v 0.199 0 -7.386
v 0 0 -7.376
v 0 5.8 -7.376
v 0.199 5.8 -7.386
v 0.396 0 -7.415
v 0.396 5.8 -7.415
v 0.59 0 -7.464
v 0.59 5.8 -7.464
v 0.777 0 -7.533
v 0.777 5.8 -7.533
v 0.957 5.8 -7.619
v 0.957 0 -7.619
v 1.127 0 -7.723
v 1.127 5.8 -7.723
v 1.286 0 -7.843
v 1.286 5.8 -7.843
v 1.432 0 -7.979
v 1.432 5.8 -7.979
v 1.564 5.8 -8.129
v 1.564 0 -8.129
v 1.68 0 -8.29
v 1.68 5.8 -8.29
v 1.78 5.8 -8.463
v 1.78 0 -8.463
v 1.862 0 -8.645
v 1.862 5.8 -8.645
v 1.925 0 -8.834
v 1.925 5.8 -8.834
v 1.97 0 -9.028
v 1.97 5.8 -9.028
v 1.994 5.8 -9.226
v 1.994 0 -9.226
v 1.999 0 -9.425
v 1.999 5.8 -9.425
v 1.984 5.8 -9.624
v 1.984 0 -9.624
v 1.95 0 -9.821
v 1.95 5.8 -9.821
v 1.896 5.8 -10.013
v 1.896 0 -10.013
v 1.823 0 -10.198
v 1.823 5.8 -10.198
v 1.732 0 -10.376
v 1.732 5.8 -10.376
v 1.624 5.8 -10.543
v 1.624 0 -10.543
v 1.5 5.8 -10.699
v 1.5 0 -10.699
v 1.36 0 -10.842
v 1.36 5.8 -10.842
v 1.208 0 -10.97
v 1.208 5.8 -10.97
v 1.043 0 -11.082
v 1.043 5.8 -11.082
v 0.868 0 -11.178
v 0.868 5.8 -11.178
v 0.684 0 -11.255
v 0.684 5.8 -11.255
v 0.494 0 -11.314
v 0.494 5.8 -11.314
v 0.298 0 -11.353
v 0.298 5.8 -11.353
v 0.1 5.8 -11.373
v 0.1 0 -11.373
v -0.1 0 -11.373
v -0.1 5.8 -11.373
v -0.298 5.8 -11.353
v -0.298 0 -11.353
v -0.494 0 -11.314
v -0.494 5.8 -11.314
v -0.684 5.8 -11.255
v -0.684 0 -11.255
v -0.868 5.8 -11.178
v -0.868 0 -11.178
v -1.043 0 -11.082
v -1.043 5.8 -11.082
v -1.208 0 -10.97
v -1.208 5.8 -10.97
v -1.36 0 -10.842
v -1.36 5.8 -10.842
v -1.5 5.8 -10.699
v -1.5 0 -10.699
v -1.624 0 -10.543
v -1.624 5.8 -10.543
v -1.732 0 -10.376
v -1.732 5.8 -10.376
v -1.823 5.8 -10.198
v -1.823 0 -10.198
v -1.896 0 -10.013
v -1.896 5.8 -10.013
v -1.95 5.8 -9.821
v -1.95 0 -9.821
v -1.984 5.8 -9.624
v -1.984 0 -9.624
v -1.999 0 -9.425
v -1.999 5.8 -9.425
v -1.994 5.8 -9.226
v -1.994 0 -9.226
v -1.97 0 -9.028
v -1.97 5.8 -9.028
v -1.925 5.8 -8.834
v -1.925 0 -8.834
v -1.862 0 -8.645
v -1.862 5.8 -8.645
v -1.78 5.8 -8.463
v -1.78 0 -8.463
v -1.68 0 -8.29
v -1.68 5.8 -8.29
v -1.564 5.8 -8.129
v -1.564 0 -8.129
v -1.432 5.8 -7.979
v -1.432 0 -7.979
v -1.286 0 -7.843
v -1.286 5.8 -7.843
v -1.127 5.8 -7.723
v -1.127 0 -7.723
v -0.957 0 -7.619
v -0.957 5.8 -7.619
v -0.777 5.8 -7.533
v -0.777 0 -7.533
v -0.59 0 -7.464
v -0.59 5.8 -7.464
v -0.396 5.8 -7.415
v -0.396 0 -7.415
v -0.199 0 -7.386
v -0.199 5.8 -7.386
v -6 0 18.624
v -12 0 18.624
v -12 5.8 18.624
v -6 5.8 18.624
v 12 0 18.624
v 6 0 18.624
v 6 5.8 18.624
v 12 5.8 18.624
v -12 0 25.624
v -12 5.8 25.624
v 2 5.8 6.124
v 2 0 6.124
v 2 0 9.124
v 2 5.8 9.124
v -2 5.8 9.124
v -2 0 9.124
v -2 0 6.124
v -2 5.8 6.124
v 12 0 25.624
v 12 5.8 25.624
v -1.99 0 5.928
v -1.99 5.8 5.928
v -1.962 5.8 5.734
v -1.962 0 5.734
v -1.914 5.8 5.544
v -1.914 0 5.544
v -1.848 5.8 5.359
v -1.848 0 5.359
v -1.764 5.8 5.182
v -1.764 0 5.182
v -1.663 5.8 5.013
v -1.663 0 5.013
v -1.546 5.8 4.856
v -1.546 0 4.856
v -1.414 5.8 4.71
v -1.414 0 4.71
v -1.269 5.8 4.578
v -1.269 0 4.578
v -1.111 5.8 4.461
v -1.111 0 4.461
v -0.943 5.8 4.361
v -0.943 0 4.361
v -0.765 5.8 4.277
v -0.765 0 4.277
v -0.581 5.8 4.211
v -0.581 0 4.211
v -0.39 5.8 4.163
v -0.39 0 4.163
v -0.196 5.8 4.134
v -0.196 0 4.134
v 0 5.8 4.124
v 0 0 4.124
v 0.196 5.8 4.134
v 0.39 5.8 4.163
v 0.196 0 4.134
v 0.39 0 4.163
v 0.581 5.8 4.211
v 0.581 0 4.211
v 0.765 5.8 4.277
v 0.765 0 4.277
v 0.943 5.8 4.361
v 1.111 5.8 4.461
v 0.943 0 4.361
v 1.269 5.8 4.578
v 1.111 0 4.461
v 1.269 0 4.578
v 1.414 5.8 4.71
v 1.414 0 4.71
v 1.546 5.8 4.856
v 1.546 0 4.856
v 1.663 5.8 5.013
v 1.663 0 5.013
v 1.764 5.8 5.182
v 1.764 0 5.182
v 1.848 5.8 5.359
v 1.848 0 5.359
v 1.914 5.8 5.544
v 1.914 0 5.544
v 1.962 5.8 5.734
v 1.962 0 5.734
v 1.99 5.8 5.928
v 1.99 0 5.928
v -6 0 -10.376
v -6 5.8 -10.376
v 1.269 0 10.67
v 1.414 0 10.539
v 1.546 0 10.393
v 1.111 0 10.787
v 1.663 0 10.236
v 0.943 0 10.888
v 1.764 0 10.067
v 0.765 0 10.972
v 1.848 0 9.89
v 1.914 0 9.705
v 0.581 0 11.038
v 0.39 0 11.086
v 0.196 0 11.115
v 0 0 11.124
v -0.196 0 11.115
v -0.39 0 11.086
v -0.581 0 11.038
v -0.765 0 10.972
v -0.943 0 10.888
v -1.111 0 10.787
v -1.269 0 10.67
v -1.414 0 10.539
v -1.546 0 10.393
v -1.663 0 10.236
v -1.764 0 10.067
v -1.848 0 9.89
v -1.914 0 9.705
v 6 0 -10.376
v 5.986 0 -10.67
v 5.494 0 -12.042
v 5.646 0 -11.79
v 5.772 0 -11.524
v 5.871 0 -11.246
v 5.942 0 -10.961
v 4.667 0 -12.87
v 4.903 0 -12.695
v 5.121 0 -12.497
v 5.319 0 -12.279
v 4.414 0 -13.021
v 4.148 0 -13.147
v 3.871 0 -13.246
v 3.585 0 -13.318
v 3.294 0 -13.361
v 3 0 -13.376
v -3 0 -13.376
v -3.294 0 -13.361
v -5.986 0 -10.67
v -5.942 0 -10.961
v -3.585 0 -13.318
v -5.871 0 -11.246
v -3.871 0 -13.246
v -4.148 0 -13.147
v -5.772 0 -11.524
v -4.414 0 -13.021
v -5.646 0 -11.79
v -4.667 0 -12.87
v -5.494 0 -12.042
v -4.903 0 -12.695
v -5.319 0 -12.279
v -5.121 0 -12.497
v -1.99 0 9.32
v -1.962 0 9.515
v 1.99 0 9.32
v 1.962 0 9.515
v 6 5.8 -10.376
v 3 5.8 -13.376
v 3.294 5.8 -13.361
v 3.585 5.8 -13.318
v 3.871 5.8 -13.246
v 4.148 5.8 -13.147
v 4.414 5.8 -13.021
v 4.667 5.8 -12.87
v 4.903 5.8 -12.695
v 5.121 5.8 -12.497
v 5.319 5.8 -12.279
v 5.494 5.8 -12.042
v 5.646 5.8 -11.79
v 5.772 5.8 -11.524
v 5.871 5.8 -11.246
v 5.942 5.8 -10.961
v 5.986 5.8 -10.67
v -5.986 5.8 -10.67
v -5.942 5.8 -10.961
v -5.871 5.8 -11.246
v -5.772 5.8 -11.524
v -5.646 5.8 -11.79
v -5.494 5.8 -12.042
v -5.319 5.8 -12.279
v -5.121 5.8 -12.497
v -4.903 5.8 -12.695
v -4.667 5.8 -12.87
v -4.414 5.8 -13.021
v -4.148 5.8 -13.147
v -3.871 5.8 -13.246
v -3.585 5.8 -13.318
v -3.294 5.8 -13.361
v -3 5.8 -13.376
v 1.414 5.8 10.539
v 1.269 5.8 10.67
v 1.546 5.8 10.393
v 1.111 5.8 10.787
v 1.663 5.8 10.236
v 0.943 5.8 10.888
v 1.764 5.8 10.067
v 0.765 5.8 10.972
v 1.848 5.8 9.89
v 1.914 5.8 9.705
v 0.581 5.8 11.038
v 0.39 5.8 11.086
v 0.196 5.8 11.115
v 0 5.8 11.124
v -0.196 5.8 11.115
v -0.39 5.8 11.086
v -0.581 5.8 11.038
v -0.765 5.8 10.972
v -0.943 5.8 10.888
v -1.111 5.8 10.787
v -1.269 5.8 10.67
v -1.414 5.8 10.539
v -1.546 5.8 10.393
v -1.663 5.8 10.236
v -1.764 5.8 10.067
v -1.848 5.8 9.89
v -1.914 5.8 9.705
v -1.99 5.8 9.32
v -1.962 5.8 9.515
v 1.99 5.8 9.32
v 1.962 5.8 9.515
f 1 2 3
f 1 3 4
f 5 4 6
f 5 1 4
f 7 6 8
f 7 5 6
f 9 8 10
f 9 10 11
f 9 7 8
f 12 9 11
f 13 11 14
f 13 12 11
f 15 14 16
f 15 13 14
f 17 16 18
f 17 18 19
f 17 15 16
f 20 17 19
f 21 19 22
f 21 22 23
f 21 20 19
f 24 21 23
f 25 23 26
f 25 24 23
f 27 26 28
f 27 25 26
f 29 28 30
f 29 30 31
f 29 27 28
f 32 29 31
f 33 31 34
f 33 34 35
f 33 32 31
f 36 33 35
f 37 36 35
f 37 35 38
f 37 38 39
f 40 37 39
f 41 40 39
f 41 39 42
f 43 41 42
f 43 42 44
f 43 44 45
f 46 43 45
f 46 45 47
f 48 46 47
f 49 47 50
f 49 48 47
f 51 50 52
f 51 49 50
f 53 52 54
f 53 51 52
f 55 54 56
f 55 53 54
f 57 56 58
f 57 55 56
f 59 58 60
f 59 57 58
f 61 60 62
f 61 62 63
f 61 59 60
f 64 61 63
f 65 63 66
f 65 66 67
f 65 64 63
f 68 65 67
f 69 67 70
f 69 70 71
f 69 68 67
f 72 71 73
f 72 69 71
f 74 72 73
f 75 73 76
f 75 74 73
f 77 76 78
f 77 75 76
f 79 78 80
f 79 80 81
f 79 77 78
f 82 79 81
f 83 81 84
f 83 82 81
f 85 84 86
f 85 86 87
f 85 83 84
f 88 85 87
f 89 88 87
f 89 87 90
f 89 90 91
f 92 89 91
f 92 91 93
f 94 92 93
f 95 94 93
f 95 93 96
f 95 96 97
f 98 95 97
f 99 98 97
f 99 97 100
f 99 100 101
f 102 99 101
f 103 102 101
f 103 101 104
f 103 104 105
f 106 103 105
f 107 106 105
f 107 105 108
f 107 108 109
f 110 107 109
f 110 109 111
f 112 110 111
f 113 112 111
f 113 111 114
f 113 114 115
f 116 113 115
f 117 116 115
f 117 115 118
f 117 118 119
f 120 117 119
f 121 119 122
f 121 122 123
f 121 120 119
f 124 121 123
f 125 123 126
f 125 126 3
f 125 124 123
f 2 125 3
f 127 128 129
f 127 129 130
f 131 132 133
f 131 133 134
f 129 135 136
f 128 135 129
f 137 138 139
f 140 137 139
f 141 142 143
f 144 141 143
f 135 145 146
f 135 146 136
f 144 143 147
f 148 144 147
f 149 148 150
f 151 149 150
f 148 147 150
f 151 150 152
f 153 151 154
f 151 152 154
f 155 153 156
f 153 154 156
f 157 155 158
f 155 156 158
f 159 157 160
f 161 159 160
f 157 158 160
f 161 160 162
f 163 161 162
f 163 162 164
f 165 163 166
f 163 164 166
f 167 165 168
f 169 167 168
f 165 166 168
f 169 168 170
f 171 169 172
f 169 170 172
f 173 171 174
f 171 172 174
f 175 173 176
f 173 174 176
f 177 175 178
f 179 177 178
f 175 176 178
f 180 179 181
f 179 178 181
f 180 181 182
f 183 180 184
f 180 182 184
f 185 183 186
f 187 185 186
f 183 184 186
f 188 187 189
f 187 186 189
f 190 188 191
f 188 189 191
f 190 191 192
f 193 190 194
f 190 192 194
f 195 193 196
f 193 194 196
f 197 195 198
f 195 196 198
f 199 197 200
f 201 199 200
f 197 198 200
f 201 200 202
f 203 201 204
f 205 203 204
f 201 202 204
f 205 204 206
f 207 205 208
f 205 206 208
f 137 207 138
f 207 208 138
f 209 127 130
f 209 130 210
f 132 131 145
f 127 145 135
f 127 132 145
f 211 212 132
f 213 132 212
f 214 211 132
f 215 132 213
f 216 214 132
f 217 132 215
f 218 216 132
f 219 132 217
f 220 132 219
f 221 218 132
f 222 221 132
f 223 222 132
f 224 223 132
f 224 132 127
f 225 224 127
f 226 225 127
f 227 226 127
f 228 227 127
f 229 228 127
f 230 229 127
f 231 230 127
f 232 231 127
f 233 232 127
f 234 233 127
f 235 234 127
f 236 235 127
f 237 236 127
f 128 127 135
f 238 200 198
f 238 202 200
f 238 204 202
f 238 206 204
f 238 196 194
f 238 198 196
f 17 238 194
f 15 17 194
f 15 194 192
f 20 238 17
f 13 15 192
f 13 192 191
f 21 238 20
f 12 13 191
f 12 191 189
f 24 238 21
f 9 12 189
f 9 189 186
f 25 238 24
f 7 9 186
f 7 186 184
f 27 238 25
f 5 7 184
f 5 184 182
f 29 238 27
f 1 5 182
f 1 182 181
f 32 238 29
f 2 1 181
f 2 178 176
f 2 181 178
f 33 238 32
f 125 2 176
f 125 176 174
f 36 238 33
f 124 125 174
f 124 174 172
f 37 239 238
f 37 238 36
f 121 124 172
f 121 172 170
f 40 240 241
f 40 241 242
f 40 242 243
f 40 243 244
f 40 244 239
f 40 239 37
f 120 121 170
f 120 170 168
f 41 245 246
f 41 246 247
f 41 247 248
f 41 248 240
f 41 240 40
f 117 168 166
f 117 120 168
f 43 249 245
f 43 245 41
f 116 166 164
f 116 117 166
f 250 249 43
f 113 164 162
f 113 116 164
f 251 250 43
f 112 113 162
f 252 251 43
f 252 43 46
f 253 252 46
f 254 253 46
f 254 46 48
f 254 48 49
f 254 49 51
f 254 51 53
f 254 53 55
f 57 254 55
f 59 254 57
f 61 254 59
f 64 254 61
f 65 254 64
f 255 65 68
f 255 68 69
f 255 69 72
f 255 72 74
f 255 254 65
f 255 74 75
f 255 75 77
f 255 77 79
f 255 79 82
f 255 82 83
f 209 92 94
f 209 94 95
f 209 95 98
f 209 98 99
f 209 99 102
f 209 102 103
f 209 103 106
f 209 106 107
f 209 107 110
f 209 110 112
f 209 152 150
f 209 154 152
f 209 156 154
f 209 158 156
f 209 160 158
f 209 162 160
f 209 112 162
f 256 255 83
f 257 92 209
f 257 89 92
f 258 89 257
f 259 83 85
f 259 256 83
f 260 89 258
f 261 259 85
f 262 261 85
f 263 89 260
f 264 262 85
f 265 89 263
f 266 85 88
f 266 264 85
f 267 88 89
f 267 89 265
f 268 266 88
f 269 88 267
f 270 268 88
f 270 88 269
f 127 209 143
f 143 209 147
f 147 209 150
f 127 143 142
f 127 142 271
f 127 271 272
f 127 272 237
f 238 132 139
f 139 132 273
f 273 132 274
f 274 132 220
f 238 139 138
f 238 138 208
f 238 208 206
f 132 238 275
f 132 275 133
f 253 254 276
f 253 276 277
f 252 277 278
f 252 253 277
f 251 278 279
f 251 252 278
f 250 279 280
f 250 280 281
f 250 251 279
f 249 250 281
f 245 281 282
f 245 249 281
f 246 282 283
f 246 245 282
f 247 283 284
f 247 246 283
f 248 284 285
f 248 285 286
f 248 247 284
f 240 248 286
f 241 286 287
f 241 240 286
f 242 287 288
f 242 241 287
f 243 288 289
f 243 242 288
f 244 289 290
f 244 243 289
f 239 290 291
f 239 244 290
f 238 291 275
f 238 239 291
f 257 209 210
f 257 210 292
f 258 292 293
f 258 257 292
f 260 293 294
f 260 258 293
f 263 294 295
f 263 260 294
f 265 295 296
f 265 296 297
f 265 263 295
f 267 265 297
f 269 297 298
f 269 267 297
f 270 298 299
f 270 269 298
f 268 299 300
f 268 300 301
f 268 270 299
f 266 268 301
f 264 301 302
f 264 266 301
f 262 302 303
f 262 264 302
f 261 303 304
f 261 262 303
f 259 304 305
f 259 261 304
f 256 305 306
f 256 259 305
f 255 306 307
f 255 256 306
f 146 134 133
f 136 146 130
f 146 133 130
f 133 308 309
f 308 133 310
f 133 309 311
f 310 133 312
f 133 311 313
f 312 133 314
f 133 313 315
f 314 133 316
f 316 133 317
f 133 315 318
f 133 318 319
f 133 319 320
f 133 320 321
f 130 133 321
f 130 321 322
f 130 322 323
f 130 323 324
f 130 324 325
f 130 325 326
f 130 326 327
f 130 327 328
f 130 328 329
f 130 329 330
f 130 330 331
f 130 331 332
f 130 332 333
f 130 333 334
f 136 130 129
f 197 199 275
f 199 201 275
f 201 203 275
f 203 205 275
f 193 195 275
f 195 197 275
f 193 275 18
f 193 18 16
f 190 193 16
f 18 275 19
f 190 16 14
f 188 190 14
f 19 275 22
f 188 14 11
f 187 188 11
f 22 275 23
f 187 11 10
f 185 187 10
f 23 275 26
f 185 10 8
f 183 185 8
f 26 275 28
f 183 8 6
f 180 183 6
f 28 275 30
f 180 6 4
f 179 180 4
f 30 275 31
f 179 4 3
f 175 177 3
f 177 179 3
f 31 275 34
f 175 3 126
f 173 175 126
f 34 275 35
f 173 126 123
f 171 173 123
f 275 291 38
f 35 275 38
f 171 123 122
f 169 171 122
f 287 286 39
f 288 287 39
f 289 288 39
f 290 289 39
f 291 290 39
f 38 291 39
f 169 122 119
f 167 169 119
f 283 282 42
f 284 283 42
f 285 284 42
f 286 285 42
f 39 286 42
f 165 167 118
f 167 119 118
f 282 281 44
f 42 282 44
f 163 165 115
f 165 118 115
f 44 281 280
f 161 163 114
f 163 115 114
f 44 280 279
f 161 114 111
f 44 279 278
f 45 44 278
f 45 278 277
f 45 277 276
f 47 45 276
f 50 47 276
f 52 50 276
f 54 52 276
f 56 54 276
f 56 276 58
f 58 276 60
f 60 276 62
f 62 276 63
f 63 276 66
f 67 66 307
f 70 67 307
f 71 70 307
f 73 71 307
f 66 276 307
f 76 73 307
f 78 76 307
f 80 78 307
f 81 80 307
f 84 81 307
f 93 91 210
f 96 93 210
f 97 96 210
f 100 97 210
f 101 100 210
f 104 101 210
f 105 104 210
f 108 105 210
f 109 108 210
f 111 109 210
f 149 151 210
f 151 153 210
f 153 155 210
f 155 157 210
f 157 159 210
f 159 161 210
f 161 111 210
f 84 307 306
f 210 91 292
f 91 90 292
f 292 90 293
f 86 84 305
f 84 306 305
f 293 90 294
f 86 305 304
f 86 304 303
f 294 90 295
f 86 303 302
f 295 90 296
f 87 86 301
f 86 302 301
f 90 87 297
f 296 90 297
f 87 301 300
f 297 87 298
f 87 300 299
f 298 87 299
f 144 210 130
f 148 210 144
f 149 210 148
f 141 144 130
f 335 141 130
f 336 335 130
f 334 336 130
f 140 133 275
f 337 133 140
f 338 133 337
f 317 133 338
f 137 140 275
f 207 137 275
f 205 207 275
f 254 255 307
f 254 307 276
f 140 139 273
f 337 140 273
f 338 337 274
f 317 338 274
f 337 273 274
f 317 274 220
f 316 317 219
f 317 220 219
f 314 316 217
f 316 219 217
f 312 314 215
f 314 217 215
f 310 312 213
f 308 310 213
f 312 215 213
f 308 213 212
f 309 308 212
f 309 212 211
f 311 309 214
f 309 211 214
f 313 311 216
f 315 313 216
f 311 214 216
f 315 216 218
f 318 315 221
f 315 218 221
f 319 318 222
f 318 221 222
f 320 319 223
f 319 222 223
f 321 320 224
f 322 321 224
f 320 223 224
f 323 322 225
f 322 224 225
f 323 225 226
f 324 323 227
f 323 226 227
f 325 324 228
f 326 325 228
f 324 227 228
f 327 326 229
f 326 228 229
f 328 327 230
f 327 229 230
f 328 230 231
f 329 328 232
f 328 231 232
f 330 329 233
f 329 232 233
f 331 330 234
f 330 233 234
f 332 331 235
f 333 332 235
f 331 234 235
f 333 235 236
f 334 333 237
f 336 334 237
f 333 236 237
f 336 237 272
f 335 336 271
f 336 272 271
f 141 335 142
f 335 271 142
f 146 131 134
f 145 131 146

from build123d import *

# Parameters (mm, degrees)
SKETCH1_R           = 2
BOSS_EXTRUDE1_DEPTH = 5.8


with BuildPart() as part:
    # Sketch1 → Boss-Extrude1 (new body)
    with BuildSketch(Plane(origin=(0, 0, 0), x_dir=(1, 0, 0), z_dir=(0, 1, 0))):
        with BuildLine():
            Line((6, -18.624423913), (12, -18.624423913))
            Line((12, -18.624423913), (12, -25.624423913))
            Line((12, -25.624423913), (-12, -25.624423913))
            Line((-12, -25.624423913), (-12, -18.624423913))
            Line((-12, -18.624423913), (-6, -18.624423913))
            Line((-6, -18.624423913), (-6, 10.375576087))
            ThreePointArc((-6, 10.375576087), (-5.121320344, 12.496896431), (-3, 13.375576087))
            Line((-3, 13.375576087), (3, 13.375576087))
            ThreePointArc((3, 13.375576087), (5.121320344, 12.496896431), (6, 10.375576087))
            Line((6, 10.375576087), (6, -18.624423913))
        make_face()
        with Locations(Location((0, 9.375576087, 0), (0, 0, 270))):
            Circle(SKETCH1_R, mode=Mode.SUBTRACT)
        with BuildLine():
            Line((-2, -9.124423913), (-2, -6.124423913))
            ThreePointArc((-2, -6.124423913), (0, -4.124423913), (2, -6.124423913))
            Line((2, -6.124423913), (2, -9.124423913))
            ThreePointArc((2, -9.124423913), (0, -11.124423913), (-2, -9.124423913))
        make_face(mode=Mode.SUBTRACT)
    extrude(amount=BOSS_EXTRUDE1_DEPTH)


solid = part.part
